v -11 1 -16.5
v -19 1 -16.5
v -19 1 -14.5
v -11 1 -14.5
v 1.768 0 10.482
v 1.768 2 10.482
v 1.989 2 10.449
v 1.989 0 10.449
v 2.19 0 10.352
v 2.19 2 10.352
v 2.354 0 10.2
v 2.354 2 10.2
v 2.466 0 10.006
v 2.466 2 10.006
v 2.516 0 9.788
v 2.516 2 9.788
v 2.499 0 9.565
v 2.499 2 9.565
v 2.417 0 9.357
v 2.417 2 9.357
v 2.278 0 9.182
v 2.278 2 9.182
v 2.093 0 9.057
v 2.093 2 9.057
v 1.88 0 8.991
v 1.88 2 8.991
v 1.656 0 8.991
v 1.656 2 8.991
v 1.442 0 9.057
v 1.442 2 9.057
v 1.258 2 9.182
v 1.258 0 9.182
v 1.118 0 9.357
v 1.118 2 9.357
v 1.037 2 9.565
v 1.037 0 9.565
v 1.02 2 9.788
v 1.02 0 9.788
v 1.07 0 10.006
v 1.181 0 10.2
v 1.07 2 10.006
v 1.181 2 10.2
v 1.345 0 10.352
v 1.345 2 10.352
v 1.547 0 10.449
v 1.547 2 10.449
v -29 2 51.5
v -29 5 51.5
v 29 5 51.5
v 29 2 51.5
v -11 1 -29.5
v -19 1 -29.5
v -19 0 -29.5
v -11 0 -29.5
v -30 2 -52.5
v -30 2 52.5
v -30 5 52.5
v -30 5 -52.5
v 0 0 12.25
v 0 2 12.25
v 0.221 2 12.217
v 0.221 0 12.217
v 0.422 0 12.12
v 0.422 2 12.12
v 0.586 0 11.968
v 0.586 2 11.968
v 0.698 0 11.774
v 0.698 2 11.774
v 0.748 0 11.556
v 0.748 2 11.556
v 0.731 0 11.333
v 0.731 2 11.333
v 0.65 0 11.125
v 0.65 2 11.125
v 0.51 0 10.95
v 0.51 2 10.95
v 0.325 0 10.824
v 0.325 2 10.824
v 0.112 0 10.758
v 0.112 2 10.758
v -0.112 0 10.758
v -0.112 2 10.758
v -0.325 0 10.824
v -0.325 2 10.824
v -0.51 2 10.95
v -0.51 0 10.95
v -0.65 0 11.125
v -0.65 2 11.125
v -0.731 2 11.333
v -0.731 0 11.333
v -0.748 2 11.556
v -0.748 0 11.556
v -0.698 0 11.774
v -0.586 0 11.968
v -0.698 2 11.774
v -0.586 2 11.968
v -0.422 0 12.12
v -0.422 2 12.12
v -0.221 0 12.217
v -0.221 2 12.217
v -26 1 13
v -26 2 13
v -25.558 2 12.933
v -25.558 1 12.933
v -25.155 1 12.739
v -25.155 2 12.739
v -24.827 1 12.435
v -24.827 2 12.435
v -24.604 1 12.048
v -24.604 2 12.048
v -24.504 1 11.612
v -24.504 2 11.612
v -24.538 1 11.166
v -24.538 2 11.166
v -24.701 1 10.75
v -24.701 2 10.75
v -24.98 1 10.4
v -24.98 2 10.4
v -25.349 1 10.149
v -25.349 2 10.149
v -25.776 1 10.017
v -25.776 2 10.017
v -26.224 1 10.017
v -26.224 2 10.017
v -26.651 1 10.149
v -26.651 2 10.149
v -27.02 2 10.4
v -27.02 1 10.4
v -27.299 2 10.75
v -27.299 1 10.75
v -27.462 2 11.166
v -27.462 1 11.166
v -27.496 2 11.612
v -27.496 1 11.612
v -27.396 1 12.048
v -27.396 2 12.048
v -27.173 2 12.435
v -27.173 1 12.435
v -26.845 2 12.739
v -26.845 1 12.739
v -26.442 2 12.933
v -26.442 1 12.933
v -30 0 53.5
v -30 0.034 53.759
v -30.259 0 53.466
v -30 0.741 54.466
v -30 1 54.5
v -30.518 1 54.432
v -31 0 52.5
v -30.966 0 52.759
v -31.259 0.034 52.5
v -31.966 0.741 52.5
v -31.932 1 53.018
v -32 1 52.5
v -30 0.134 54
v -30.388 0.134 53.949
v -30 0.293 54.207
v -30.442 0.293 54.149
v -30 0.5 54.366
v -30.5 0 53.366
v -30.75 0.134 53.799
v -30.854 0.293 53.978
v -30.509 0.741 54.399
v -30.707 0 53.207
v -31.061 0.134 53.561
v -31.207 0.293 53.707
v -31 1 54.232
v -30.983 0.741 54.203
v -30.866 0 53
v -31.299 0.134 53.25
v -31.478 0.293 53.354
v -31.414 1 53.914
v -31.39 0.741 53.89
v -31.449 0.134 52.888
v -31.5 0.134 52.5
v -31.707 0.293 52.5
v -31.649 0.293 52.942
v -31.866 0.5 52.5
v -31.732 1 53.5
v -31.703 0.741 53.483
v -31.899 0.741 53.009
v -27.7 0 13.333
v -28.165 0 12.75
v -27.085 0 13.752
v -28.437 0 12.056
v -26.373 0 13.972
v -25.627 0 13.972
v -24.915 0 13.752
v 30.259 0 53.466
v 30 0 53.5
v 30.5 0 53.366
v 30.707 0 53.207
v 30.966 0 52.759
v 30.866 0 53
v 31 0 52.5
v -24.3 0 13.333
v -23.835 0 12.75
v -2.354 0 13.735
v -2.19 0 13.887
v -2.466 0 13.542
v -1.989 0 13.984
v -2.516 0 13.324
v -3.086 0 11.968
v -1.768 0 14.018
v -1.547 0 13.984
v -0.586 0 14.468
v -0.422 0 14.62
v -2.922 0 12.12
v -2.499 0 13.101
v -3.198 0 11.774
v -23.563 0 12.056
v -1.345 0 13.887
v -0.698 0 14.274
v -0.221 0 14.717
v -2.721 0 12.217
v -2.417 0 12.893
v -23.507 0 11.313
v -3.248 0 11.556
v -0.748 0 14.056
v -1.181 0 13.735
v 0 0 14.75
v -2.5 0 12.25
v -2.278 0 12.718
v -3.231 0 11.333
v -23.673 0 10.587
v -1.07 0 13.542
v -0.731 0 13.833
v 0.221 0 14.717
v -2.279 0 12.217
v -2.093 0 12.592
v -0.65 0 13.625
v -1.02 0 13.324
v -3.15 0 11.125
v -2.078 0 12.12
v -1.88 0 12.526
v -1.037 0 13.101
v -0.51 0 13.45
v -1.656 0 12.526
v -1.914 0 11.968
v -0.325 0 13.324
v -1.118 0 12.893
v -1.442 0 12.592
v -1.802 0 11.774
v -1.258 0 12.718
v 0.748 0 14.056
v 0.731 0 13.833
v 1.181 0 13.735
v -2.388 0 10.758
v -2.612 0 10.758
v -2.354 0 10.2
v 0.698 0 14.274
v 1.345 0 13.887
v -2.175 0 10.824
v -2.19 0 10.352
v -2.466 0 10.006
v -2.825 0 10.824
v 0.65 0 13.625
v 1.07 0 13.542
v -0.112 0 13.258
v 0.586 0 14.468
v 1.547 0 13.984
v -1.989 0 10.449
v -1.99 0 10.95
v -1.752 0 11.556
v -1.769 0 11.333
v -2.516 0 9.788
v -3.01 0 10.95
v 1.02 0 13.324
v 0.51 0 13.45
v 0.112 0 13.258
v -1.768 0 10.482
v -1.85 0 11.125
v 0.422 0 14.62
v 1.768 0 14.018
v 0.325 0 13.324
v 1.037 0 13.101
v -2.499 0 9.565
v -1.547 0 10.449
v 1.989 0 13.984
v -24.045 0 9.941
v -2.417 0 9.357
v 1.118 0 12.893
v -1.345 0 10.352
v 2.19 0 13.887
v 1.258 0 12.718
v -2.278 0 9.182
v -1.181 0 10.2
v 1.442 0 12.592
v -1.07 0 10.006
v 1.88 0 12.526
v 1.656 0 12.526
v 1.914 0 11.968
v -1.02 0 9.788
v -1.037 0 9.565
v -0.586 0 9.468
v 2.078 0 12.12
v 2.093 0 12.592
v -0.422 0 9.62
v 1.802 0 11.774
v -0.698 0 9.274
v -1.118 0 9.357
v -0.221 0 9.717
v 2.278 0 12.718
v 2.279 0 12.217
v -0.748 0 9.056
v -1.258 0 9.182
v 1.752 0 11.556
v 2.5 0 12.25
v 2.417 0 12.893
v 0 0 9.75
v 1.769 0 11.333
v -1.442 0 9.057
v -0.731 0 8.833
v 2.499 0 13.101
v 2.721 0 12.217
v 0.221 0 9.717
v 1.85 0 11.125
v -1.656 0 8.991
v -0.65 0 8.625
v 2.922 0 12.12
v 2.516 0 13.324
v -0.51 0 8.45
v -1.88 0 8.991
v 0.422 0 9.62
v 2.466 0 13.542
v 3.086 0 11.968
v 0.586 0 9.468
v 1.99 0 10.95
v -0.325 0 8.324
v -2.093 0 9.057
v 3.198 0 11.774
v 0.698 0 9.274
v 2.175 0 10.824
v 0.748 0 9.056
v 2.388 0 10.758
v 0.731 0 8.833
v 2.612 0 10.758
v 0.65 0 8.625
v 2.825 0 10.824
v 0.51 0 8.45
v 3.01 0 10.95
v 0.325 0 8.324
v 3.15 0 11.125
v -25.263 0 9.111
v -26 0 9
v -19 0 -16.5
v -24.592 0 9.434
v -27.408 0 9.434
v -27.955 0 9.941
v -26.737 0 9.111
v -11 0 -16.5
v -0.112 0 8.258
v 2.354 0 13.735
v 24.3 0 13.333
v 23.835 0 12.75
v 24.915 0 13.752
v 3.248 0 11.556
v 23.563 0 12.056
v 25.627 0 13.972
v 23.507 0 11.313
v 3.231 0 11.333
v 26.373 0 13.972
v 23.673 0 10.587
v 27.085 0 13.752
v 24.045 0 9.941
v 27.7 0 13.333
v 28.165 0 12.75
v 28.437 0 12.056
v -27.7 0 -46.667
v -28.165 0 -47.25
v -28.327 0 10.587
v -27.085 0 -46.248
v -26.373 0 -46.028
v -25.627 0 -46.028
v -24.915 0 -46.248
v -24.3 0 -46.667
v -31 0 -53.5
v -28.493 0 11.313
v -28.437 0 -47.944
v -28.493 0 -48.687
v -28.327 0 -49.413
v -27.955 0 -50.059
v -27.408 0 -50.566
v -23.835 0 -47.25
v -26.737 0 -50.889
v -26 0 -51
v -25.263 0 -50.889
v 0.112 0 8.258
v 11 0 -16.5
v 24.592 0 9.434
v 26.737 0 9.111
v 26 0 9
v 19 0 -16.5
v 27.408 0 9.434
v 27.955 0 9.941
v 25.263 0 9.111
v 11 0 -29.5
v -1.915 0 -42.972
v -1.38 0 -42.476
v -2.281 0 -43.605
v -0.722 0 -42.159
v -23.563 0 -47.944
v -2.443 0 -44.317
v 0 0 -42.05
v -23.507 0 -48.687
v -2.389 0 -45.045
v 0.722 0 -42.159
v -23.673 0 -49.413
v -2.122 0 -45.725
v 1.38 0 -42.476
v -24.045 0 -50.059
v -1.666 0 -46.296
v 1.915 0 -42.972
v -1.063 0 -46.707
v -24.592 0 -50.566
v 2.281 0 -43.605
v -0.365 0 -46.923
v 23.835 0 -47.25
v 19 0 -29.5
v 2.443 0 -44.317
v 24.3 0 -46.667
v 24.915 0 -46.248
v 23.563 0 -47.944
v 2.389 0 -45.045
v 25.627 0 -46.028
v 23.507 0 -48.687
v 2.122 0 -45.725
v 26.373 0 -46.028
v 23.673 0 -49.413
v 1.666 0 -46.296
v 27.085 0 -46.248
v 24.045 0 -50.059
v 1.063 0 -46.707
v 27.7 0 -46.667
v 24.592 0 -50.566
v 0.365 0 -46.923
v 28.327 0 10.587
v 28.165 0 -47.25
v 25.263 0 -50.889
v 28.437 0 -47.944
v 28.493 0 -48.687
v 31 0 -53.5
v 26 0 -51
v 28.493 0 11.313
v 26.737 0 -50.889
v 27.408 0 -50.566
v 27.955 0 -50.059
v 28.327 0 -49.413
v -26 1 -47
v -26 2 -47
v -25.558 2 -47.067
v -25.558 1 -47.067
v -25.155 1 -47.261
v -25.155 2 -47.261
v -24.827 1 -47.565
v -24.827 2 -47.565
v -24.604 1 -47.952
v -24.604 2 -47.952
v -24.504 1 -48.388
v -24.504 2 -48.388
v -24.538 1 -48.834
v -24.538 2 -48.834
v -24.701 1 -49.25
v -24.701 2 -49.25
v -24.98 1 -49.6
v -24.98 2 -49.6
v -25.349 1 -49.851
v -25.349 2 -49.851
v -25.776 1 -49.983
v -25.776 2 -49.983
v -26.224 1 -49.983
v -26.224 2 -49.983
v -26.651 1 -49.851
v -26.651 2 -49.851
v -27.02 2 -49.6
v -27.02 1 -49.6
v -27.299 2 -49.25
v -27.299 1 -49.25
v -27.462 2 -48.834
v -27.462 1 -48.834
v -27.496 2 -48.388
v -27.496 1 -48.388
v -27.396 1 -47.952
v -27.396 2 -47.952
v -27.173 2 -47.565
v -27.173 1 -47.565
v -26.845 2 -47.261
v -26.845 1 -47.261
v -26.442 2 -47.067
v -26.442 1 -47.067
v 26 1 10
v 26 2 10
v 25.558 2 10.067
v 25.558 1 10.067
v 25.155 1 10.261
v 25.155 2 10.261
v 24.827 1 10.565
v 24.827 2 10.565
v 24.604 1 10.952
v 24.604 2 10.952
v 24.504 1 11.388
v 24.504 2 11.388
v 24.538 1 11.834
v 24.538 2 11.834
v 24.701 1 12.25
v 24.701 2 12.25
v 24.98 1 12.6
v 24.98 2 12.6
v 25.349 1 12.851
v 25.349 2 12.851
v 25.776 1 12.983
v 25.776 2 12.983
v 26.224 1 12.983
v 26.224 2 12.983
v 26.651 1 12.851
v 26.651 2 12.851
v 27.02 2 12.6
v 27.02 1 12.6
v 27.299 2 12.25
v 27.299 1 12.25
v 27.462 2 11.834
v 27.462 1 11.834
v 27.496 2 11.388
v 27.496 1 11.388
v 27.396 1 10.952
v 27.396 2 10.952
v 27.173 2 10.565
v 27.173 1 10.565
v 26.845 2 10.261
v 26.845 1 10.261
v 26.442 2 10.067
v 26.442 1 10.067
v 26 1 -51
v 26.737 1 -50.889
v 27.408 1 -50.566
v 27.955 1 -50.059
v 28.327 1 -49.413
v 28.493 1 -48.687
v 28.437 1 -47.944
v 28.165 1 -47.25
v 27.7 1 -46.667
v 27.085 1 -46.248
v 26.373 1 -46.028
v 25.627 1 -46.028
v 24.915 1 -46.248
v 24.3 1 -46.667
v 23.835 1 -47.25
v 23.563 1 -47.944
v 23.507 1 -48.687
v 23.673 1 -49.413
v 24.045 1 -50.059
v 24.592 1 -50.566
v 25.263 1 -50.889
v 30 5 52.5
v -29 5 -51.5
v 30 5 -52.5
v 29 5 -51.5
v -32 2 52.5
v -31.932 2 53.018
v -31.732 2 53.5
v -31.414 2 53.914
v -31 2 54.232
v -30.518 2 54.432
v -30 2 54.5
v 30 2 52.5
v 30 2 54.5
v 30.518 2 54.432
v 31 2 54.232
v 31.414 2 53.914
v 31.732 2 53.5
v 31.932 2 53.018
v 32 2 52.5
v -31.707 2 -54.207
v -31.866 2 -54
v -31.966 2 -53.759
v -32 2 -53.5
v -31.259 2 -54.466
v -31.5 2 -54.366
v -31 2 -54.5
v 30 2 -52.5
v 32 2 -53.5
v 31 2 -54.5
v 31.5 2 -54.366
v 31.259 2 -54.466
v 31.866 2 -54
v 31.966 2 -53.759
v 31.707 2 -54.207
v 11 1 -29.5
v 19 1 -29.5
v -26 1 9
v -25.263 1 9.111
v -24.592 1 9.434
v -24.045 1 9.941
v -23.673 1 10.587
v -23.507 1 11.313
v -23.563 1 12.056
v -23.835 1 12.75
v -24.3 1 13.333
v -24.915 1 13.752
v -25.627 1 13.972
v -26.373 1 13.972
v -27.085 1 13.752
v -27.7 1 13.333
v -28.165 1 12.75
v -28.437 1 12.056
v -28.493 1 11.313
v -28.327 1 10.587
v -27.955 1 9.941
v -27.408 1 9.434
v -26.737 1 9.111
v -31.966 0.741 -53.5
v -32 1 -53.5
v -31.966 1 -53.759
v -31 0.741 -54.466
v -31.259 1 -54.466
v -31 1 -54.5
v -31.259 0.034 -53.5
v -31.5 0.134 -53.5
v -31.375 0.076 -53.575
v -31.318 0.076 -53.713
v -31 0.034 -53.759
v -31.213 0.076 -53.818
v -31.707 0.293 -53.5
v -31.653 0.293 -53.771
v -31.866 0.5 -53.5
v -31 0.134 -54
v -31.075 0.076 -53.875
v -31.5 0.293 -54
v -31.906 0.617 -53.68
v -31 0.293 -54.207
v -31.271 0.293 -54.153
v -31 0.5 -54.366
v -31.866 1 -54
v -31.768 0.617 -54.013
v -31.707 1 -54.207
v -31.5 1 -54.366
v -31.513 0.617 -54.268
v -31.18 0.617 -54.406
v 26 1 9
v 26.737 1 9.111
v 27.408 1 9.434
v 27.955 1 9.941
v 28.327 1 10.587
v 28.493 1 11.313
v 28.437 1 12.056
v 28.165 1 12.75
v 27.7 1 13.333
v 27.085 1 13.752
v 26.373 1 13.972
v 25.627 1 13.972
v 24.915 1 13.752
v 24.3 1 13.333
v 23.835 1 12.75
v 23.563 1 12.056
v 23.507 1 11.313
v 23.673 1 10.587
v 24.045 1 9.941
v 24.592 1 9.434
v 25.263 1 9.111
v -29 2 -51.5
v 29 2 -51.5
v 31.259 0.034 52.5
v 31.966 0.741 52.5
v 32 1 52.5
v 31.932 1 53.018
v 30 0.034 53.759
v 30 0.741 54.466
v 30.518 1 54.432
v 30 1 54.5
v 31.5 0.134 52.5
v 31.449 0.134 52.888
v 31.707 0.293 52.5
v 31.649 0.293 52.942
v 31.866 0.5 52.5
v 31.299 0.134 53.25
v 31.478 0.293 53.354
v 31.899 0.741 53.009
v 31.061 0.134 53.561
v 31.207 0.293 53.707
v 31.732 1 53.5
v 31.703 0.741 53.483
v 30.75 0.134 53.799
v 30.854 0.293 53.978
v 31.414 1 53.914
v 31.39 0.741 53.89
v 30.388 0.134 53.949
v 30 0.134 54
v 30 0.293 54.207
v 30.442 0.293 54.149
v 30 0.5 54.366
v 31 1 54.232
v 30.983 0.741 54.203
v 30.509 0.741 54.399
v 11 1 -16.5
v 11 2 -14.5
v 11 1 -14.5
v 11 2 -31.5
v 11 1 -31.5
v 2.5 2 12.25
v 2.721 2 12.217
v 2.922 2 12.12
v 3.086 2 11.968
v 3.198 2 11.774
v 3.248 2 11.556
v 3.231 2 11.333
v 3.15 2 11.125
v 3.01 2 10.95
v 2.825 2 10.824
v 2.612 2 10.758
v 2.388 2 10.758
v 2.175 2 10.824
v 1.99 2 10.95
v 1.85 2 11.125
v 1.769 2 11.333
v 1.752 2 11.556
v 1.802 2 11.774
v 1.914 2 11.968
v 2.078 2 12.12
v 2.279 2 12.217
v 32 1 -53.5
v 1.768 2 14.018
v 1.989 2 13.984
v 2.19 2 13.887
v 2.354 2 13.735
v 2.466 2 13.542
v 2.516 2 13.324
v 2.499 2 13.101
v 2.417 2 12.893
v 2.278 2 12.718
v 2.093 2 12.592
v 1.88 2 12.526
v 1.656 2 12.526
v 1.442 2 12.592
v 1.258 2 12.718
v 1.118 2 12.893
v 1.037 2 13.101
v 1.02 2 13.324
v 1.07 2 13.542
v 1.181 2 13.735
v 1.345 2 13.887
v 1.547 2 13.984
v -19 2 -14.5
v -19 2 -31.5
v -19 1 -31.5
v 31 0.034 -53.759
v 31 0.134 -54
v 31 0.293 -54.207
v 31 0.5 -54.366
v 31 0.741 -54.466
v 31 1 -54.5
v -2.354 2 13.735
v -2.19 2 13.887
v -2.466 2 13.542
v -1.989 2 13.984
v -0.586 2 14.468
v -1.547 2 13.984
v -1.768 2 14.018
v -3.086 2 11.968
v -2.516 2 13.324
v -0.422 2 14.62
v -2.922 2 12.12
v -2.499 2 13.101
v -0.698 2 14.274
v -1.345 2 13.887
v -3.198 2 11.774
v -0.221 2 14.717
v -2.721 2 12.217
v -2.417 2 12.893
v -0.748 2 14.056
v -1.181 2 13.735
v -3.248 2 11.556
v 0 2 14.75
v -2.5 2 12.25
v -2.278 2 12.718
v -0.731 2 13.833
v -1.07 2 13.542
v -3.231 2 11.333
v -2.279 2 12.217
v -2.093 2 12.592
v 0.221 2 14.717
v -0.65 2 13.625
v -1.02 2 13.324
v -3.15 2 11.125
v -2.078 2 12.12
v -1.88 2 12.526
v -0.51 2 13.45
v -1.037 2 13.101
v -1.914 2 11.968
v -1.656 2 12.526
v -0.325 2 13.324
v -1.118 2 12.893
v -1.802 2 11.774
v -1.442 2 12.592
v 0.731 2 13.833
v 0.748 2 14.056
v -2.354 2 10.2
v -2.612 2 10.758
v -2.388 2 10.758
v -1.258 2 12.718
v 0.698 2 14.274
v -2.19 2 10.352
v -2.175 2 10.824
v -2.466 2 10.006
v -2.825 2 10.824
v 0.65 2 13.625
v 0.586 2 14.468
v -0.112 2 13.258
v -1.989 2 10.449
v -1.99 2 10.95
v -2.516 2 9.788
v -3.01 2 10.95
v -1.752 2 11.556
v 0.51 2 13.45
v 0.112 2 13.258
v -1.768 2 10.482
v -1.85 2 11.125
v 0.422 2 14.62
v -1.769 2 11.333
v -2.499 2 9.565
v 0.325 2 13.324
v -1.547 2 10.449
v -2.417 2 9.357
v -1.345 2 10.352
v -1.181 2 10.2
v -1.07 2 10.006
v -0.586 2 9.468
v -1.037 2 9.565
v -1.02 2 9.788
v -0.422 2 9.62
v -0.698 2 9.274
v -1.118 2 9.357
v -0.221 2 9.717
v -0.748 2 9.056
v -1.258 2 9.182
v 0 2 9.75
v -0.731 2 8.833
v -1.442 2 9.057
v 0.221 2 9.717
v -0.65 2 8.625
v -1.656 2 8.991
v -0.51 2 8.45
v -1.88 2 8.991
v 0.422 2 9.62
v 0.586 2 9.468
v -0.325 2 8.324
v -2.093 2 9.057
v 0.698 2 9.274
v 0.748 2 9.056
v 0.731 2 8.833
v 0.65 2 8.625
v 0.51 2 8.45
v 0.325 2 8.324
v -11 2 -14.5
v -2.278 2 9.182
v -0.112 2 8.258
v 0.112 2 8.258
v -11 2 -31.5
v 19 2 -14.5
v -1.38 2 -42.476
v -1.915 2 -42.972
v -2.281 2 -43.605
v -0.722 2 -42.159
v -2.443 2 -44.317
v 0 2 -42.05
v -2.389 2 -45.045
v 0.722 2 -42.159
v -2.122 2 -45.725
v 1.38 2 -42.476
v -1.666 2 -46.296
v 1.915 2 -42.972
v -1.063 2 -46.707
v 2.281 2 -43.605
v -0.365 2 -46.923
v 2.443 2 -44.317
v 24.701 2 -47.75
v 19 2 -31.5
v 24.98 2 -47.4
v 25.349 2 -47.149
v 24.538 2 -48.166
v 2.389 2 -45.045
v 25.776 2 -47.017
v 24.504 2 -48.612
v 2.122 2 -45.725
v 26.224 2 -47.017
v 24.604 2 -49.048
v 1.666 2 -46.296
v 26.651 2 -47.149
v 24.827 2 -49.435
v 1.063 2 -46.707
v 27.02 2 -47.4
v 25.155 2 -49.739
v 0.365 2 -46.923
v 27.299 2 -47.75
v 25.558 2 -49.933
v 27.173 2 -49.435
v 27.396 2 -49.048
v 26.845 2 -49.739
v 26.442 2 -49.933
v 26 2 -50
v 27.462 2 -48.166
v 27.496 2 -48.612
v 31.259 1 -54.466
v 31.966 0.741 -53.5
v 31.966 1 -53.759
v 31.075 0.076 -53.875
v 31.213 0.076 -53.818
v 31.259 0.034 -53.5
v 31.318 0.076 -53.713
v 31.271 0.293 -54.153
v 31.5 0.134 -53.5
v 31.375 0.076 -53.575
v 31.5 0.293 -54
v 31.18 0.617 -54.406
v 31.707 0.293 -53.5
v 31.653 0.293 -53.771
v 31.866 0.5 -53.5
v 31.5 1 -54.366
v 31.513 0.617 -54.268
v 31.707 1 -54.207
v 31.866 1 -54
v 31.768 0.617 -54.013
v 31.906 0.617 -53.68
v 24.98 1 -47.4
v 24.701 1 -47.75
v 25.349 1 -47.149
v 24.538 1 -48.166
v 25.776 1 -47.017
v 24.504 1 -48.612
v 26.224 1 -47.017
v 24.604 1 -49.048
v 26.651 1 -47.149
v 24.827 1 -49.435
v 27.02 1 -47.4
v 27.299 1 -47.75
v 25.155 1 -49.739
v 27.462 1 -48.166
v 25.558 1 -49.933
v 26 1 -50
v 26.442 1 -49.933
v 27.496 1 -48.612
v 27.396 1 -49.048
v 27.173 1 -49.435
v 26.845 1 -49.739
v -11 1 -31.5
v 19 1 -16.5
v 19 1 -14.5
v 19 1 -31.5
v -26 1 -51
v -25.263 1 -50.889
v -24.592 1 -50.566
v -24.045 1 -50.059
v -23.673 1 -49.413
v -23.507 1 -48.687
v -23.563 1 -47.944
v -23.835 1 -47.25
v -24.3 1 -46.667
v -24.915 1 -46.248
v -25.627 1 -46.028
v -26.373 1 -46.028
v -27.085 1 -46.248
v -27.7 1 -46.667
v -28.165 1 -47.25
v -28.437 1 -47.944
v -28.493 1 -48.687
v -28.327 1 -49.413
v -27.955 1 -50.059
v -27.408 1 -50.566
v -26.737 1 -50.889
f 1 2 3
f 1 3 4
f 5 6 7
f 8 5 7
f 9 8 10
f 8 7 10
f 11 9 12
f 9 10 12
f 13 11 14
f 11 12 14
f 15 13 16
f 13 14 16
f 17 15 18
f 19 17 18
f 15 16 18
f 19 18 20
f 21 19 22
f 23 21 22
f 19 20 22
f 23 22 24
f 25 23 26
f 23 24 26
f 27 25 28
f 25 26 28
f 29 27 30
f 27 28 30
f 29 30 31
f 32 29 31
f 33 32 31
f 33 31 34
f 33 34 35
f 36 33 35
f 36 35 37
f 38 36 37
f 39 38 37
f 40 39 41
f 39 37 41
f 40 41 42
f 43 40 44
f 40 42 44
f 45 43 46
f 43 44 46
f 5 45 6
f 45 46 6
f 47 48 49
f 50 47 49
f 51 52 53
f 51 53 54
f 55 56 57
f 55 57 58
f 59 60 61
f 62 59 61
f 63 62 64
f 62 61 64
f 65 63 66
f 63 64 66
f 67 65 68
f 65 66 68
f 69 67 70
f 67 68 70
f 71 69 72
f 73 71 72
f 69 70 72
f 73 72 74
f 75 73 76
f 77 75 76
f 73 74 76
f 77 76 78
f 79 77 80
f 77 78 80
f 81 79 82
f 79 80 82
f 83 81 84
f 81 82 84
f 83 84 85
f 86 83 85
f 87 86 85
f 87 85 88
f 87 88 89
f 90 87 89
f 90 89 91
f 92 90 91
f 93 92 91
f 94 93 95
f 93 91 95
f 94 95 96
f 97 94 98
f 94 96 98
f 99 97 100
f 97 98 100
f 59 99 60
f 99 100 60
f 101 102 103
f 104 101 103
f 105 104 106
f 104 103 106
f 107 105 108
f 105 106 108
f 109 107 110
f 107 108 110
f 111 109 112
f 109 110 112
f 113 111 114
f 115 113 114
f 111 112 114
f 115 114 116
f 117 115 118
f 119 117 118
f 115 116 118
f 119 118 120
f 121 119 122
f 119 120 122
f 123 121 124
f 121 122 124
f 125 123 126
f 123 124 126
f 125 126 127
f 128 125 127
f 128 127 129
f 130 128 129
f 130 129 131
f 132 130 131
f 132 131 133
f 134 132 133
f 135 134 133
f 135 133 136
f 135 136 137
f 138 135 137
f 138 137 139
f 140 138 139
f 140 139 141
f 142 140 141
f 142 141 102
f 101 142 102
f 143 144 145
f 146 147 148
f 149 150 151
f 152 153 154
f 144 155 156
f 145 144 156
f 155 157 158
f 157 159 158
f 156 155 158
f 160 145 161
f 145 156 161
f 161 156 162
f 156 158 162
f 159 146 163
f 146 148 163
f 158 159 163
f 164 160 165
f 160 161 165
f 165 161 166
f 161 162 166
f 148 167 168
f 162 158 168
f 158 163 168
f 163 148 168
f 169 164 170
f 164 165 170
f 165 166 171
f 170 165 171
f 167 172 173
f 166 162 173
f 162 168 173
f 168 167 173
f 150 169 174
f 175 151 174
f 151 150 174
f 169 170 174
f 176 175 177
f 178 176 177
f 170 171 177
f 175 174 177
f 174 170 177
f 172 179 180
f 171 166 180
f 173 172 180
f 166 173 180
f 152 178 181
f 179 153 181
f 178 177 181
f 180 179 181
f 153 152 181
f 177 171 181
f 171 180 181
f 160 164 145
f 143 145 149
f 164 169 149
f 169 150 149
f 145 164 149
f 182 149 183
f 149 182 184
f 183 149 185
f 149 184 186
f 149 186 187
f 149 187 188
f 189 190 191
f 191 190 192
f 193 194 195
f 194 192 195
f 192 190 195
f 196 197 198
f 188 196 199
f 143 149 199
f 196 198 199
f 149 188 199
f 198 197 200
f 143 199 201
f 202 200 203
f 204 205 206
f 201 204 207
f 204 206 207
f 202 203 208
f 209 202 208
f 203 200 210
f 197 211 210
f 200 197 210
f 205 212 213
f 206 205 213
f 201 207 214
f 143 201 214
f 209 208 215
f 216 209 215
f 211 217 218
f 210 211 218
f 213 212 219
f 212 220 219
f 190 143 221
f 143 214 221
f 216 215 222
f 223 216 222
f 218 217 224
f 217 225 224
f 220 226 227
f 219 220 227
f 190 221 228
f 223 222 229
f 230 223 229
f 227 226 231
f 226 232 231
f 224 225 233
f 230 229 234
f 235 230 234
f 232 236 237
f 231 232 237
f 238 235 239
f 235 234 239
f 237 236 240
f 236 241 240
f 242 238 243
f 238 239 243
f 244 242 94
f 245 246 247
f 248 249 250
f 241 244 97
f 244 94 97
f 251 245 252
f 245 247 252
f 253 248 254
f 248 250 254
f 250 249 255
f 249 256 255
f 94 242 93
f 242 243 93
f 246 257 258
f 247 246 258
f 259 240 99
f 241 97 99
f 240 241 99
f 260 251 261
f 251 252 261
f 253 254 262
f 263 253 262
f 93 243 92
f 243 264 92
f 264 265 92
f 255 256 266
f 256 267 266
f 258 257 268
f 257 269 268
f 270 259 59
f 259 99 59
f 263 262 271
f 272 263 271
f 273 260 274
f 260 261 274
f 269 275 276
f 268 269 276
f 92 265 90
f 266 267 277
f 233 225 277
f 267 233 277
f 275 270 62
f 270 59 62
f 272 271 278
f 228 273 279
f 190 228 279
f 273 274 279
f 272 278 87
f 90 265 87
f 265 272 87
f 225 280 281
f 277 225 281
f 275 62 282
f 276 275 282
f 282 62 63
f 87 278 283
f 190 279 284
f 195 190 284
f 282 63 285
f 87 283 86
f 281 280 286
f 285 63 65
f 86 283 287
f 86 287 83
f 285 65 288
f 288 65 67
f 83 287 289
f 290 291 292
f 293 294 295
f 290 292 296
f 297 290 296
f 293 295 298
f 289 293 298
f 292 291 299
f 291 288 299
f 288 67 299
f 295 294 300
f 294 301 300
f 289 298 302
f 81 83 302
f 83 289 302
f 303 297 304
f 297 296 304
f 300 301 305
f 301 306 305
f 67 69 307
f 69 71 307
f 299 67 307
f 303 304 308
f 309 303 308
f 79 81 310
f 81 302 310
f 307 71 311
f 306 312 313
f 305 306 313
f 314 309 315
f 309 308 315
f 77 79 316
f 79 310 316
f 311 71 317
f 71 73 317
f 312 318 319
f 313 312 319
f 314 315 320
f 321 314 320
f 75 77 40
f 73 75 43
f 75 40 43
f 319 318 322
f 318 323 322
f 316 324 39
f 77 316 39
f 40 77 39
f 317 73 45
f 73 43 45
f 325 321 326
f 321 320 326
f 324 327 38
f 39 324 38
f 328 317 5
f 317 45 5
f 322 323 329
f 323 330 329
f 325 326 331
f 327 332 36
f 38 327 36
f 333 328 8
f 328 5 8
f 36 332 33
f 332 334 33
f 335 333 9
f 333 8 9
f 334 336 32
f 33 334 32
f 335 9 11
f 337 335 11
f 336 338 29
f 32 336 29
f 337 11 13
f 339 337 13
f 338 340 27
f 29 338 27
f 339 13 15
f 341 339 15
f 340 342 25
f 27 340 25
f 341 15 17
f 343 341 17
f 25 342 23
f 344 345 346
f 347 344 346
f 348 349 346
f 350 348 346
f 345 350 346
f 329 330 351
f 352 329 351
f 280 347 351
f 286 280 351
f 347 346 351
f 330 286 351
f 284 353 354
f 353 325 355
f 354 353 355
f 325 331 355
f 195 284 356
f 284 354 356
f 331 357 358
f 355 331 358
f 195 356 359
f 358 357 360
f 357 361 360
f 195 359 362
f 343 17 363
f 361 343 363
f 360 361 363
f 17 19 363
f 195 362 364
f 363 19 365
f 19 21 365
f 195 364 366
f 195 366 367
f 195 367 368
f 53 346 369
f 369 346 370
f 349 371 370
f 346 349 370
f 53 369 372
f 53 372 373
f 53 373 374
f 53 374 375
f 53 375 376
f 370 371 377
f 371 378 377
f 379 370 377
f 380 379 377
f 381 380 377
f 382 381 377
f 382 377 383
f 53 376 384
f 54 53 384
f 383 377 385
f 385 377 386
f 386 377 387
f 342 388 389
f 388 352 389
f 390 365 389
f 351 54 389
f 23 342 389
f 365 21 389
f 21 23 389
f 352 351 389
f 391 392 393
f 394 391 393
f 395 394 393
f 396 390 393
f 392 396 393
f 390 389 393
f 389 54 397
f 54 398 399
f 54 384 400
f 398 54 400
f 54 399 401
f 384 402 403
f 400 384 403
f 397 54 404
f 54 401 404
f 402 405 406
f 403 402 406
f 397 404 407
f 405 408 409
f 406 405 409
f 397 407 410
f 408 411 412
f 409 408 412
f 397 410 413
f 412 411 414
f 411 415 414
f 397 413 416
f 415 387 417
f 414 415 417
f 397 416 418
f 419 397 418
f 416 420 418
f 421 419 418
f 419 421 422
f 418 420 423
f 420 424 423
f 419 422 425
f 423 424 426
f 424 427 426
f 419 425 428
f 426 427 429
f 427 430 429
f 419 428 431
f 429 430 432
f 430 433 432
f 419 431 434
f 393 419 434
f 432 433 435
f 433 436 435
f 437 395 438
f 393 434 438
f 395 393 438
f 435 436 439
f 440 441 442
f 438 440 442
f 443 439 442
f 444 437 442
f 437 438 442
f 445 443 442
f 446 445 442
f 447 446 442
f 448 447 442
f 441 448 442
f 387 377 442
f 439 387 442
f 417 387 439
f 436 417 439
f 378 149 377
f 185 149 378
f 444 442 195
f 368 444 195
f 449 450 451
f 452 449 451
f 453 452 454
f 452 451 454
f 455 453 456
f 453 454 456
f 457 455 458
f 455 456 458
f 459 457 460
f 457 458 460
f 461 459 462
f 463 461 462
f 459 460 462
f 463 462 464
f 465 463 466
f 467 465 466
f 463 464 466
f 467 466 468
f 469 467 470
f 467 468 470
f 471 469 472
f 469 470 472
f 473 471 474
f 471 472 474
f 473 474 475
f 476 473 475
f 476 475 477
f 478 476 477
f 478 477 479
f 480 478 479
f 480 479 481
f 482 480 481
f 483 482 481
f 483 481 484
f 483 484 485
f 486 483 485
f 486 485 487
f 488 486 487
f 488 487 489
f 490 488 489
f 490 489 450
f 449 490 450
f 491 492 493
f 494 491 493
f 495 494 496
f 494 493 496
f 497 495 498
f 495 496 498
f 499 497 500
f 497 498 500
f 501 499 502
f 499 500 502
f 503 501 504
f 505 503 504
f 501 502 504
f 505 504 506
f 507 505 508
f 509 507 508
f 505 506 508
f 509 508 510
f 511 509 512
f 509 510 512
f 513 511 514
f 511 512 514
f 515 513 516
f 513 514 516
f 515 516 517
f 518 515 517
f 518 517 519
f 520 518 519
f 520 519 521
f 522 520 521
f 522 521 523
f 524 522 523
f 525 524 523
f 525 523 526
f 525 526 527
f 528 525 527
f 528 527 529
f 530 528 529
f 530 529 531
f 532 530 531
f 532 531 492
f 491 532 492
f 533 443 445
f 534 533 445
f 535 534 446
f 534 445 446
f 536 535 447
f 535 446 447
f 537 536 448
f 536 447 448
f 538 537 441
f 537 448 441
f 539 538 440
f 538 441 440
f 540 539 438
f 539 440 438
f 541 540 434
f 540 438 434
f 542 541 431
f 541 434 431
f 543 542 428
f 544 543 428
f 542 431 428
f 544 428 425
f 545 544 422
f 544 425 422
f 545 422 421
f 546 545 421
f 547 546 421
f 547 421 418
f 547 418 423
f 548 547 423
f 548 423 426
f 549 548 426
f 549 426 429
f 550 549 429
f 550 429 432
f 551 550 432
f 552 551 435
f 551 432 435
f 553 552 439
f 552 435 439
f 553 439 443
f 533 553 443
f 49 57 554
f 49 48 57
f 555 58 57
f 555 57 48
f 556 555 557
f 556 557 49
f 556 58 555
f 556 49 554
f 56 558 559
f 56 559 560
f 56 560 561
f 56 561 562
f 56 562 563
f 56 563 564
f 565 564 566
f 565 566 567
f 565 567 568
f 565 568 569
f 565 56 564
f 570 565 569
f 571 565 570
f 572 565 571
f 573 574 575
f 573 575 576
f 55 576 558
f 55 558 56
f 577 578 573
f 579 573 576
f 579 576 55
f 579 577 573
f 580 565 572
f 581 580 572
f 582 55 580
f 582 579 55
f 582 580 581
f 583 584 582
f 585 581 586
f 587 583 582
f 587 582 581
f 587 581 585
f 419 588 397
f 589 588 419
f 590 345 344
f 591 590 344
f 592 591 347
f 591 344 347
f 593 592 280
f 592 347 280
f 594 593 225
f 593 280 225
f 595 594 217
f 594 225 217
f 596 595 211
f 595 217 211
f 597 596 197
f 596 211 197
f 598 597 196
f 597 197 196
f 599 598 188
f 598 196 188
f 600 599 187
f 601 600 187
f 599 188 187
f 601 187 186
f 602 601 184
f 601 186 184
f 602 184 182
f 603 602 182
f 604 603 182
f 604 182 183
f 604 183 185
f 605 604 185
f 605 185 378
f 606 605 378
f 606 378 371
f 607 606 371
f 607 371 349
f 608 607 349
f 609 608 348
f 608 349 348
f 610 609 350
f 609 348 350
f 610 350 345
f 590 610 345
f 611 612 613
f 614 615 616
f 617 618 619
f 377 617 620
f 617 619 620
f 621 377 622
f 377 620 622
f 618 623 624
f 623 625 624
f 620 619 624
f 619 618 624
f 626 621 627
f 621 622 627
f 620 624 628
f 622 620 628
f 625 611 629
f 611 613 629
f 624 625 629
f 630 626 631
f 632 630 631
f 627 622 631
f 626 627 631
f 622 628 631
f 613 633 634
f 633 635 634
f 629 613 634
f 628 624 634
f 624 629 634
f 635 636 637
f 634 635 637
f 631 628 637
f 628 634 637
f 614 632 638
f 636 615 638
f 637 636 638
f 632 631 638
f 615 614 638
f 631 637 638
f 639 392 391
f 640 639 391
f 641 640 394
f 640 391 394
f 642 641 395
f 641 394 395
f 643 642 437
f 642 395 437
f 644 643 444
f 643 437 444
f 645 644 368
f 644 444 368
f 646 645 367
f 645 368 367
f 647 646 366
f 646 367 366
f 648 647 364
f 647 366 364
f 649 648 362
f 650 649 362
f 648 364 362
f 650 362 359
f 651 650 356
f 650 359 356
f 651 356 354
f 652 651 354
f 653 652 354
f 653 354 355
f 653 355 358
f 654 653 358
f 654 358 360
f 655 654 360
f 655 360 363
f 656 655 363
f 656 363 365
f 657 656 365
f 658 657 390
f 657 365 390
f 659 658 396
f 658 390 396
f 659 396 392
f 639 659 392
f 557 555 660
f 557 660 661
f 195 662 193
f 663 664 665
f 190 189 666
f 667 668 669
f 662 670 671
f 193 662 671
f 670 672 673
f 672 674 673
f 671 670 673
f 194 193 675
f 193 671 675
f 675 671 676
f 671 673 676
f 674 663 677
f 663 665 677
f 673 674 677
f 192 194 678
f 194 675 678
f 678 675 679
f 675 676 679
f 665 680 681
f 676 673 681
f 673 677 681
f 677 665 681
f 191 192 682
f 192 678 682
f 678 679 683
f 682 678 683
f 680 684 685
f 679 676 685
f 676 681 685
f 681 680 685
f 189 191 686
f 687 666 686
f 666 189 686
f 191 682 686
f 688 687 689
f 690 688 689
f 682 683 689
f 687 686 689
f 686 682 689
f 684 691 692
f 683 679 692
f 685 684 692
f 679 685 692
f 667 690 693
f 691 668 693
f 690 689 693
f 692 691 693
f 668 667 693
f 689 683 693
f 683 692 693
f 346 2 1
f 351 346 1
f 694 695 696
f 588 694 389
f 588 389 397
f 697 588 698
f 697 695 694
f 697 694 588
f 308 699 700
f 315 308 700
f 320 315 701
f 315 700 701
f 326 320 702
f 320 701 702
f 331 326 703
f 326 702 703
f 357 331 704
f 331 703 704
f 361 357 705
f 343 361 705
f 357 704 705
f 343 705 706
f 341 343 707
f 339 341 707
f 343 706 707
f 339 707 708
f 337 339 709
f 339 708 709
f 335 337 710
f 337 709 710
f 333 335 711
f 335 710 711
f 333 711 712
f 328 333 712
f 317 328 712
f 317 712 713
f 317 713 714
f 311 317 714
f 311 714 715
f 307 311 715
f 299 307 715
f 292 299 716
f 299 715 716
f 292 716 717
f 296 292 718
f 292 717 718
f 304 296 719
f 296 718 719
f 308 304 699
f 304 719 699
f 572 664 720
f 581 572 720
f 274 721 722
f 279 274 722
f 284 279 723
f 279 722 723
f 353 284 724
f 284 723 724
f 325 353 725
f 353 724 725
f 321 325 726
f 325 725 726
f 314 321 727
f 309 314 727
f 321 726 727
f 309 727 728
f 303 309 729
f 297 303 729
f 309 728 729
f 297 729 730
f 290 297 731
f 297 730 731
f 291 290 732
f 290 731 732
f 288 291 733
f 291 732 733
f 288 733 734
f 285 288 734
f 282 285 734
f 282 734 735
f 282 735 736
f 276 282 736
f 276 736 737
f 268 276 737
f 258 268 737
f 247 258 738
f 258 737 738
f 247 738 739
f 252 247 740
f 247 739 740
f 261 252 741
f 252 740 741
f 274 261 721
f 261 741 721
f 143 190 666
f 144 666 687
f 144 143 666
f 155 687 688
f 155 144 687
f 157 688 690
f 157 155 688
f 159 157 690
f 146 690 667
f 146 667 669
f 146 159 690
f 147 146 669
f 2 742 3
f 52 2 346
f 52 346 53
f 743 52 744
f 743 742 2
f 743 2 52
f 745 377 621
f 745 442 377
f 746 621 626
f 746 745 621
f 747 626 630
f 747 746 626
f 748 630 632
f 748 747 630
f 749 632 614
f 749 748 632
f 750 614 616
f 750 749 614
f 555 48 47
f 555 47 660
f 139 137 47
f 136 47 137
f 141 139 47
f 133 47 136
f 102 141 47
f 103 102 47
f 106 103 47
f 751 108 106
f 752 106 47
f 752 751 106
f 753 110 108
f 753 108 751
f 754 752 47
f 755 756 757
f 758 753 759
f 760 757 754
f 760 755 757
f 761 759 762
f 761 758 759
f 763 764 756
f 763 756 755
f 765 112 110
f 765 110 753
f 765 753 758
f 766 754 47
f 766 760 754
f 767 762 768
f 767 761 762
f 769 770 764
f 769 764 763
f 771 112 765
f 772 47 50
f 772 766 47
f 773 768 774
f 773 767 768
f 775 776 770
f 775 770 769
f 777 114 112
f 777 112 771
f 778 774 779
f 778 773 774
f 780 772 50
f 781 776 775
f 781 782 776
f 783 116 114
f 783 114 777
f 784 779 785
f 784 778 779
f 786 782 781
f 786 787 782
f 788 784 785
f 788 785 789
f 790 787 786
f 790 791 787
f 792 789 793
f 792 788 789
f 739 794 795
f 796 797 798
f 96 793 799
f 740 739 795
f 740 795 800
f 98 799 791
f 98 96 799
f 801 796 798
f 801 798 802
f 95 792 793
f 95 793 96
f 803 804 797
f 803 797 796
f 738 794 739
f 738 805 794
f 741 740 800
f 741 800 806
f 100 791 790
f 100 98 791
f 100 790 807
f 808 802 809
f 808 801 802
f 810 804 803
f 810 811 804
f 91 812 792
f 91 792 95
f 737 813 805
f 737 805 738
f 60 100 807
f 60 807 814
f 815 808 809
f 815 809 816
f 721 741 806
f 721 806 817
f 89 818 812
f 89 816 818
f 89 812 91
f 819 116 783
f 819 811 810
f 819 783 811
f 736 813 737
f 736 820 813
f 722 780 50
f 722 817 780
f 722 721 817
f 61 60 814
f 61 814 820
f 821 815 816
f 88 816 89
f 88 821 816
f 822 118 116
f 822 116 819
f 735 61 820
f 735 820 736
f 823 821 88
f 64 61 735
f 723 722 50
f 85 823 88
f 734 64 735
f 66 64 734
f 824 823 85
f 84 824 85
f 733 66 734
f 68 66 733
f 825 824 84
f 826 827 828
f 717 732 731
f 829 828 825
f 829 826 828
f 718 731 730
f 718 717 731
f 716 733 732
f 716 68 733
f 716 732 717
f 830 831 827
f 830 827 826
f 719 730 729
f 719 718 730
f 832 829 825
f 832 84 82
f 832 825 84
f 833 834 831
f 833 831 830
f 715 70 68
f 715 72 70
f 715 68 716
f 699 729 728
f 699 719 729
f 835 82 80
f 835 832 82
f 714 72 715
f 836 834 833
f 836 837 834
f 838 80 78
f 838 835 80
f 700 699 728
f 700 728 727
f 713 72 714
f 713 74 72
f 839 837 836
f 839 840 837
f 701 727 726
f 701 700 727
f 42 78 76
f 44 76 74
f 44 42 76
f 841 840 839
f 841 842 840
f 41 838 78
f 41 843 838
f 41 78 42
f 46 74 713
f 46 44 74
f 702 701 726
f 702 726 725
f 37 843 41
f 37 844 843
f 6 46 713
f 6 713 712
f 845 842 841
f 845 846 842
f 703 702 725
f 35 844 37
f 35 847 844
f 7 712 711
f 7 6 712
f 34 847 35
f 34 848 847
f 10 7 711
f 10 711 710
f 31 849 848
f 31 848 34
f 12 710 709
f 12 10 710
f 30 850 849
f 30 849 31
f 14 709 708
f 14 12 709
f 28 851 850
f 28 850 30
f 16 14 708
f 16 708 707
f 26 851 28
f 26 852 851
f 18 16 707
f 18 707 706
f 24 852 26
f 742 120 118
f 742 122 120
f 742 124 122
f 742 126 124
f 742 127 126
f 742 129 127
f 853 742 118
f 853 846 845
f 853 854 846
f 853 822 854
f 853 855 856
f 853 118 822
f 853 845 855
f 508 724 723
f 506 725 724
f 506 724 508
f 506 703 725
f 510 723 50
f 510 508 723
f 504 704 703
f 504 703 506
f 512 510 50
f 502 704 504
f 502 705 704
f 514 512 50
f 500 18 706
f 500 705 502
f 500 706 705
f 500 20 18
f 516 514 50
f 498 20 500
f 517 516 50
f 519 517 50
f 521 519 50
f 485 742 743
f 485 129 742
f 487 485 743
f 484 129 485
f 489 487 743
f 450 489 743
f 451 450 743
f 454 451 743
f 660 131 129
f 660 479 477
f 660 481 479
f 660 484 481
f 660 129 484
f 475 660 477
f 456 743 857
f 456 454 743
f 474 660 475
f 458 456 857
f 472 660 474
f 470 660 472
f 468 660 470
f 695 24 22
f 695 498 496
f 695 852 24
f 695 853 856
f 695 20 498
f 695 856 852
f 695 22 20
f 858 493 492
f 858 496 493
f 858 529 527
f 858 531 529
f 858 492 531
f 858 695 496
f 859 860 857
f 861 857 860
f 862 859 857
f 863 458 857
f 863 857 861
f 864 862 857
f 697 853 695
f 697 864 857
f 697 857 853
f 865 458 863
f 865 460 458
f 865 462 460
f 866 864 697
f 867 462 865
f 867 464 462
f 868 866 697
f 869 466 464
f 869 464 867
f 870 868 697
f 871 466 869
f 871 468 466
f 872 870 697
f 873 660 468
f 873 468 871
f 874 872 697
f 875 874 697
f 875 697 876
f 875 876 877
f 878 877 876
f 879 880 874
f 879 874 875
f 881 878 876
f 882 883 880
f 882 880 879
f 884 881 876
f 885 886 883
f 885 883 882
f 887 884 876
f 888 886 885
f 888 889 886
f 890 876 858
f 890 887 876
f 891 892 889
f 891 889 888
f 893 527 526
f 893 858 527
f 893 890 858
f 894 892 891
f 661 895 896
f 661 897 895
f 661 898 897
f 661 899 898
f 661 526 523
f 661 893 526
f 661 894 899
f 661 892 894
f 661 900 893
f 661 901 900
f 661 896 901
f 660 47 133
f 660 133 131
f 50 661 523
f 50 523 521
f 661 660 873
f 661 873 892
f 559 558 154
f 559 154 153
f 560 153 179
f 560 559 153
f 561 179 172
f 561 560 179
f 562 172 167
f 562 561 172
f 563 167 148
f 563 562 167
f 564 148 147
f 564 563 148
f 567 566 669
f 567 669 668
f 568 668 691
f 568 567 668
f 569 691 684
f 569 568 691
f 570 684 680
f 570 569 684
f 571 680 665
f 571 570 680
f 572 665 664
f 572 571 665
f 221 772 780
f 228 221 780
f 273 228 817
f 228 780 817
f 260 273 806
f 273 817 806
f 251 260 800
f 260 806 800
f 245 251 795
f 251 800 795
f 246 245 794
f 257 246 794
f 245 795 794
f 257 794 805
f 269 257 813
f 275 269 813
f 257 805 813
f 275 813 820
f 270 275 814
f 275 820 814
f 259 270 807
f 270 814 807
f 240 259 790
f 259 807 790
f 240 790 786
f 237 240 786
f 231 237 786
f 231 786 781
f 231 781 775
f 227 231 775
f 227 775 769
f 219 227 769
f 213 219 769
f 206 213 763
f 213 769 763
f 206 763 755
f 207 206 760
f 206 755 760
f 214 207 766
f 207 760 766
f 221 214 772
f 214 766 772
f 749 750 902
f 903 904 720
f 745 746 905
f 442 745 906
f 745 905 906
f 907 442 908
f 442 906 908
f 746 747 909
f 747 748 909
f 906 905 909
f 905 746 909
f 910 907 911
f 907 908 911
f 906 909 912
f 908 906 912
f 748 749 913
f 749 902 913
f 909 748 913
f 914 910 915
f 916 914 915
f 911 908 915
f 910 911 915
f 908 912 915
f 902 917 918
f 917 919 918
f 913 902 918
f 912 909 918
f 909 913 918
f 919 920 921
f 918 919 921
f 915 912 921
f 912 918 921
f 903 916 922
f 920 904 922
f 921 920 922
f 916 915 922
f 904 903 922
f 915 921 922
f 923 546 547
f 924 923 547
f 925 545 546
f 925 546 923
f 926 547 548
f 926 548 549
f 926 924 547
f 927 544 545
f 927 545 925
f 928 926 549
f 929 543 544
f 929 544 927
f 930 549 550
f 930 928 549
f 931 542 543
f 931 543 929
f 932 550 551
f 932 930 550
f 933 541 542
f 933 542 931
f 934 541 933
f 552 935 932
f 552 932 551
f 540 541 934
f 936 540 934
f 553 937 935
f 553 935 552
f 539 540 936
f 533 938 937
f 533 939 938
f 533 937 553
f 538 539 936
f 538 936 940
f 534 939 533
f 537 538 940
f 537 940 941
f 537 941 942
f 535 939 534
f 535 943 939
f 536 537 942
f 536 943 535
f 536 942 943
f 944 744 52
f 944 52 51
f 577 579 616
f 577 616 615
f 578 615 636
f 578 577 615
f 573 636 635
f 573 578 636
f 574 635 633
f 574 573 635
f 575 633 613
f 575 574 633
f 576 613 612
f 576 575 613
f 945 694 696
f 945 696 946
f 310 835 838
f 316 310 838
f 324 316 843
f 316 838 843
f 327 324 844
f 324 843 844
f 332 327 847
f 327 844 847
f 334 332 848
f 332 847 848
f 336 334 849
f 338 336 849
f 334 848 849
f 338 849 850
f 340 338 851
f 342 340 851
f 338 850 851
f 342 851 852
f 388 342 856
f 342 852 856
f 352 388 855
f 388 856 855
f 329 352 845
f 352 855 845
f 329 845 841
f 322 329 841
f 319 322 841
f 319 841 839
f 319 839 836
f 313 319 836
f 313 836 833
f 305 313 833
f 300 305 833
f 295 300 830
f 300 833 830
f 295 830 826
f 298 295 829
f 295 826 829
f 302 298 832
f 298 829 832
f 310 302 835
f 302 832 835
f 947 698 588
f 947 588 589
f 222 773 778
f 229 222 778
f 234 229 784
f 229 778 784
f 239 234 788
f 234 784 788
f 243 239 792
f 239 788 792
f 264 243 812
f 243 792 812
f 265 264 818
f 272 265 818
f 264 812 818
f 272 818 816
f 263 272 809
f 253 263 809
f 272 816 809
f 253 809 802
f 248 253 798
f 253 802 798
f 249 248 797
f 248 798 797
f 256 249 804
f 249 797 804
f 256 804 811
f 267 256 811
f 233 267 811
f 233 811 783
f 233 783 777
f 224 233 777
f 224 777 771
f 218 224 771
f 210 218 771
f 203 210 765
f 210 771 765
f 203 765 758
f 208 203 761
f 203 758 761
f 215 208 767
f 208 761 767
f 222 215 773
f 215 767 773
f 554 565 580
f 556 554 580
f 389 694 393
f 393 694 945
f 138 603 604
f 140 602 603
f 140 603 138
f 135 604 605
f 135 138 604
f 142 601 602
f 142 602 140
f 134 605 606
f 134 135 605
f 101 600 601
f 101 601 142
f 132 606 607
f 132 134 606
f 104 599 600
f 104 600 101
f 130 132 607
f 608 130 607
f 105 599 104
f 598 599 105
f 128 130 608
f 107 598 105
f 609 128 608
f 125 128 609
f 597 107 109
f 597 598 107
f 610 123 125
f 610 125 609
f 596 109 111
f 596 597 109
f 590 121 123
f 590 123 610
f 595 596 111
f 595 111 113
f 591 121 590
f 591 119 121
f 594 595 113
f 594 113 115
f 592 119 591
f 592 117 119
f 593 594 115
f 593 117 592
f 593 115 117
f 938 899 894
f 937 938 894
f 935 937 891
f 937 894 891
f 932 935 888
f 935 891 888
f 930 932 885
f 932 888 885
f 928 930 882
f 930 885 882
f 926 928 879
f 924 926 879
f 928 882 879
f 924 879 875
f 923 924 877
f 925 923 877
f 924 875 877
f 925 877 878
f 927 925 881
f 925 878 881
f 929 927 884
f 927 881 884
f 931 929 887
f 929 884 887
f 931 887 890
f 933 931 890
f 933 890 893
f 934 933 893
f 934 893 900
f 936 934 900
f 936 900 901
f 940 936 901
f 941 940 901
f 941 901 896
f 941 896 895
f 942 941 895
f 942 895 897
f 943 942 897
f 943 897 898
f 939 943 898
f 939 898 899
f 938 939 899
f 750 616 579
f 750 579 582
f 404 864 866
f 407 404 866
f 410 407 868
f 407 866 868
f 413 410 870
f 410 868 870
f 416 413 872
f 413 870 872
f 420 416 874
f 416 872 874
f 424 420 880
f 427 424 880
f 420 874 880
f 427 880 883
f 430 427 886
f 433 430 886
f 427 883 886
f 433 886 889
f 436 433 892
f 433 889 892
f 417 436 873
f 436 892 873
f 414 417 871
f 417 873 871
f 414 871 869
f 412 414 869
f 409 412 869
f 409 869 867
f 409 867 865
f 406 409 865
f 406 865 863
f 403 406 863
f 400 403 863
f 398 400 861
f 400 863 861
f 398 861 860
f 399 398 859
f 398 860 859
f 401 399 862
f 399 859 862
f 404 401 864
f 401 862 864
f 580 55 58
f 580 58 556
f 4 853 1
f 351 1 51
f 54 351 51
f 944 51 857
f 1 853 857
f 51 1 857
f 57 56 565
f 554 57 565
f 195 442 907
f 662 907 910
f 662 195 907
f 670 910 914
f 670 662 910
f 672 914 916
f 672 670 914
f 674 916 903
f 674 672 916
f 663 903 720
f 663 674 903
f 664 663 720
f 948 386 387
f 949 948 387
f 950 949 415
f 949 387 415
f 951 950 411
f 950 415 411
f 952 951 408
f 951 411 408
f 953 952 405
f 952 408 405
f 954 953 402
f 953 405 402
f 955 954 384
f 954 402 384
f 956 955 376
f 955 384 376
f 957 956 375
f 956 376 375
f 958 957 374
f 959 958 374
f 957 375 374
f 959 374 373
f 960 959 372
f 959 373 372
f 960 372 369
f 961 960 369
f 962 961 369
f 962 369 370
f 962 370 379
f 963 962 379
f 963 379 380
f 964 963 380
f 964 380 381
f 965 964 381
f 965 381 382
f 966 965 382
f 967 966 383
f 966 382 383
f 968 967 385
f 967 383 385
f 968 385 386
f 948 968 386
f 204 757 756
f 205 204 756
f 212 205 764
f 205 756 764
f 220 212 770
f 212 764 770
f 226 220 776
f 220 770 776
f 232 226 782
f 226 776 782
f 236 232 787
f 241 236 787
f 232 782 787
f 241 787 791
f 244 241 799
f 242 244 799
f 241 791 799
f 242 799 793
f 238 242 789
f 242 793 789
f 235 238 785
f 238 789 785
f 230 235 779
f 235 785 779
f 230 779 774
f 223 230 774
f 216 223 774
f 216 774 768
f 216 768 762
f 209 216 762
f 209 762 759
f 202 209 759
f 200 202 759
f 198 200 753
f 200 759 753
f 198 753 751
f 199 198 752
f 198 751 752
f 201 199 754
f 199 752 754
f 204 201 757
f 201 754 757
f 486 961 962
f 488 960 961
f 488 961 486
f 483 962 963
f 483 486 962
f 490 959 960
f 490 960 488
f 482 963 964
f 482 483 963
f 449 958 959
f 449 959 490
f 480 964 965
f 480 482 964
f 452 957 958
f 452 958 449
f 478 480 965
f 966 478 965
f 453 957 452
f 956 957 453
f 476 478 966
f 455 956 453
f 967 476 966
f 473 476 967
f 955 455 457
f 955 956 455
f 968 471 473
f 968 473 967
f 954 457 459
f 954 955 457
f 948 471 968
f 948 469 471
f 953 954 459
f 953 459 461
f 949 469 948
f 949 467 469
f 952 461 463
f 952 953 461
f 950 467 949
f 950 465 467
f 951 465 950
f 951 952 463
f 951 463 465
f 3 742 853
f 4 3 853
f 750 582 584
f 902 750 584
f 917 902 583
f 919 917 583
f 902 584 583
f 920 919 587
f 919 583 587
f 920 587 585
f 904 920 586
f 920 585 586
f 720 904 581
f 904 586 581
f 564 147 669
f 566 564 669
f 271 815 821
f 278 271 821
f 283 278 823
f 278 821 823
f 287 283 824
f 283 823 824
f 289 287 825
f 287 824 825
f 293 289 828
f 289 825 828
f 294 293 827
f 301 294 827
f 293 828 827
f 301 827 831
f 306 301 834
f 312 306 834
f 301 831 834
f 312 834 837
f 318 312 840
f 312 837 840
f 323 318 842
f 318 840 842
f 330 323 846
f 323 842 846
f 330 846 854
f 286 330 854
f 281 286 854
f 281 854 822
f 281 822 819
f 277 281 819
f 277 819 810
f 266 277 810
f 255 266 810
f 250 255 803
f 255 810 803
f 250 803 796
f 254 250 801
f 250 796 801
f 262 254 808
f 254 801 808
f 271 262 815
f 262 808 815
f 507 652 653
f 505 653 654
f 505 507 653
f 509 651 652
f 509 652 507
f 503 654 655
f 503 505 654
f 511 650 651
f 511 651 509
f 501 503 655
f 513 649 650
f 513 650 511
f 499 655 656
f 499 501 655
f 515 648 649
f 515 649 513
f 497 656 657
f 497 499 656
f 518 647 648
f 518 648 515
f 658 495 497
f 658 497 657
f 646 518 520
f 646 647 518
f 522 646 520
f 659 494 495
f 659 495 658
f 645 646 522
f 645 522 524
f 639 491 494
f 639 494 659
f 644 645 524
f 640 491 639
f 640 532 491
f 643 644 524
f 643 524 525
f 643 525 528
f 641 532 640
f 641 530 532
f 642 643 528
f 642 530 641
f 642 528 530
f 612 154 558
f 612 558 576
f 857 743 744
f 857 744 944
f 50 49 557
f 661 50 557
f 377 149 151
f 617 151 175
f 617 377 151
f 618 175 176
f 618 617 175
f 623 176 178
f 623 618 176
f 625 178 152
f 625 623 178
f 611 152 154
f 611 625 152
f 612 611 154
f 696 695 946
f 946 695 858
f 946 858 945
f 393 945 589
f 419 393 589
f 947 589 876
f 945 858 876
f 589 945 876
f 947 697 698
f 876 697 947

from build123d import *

# Parameters (mm, degrees)
SKETCH1_W           = 64
SKETCH1_H           = 109
BOSS_EXTRUDE1_DEPTH = 2
SKETCH2_W           = 60
SKETCH2_H           = 105
BOSS_EXTRUDE2_DEPTH = 3
SKETCH3_W           = 58
SKETCH3_H           = 103
CUT_EXTRUDE1_DEPTH  = 3
SKETCH4_R           = 1.5
CUT_EXTRUDE2_DEPTH  = 2
SKETCH6_R           = 2.5
CUT_EXTRUDE3_DEPTH  = 1
SKETCH7_R           = 2.45
CUT_EXTRUDE4_DEPTH  = 2
SKETCH8_W           = 8
SKETCH8_H           = 13
CUT_EXTRUDE5_DEPTH  = 2
SKETCH9_W           = 8
SKETCH9_H           = 13
CUT_EXTRUDE6_DEPTH  = 2
FILLET2_R           = 1
FILLET3_R           = 1
FILLET4_R           = 2
FILLET5_R           = 2
FILLET6_R           = 1
SKETCH10_W          = 8
SKETCH10_H          = 17
CUT_EXTRUDE7_DEPTH  = 1
SKETCH11_R          = 0.75
CUT_EXTRUDE8_DEPTH  = 2


with BuildPart() as part:
    # Sketch1 → Boss-Extrude1 (new body)
    with BuildSketch(Plane(origin=(0, 0, 0), x_dir=(1, 0, 0), z_dir=(0, 1, 0))):
        Rectangle(SKETCH1_W, SKETCH1_H)
    extrude(amount=BOSS_EXTRUDE1_DEPTH)

    # Sketch2 → Boss-Extrude2 (add)
    with BuildSketch(Plane(origin=(0, 2, 0), x_dir=(1, 0, 0), z_dir=(0, 1, 0))):
        Rectangle(SKETCH2_W, SKETCH2_H)
    extrude(amount=BOSS_EXTRUDE2_DEPTH)

    # Sketch3 → Cut-Extrude1 (cut)
    with BuildSketch(Plane(origin=(0, 5, 0), x_dir=(1, 0, 0), z_dir=(0, 1, 0))):
        Rectangle(SKETCH3_W, SKETCH3_H)
    extrude(amount=-CUT_EXTRUDE1_DEPTH, mode=Mode.SUBTRACT)

    # Sketch4 → Cut-Extrude2 (cut)
    with BuildSketch(Plane(origin=(0, 2, 0), x_dir=(1, 0, 0), z_dir=(0, 1, 0))):
        with Locations(Location((-26, 48.5, 0), (0, 0, 270))):
            Circle(SKETCH4_R)
        with Locations(Location((-26, -11.5, 0), (0, 0, 270))):
            Circle(SKETCH4_R)
        with Locations(Location((26, -11.5, 0), (0, 0, 90))):
            Circle(SKETCH4_R)
        with Locations(Location((26, 48.5, 0), (0, 0, 90))):
            Circle(SKETCH4_R)
    extrude(amount=-CUT_EXTRUDE2_DEPTH, mode=Mode.SUBTRACT)

    # Sketch6 → Cut-Extrude3 (cut)
    with BuildSketch(Plane.XZ):
        with Locations(Location((26, -48.5, 0), (0, 0, 270))):
            Circle(SKETCH6_R)
        with Locations(Location((-26, -48.5, 0), (0, 0, 270))):
            Circle(SKETCH6_R)
        with Locations(Location((26, 11.5, 0), (0, 0, 270))):
            Circle(SKETCH6_R)
        with Locations(Location((-26, 11.5, 0), (0, 0, 270))):
            Circle(SKETCH6_R)
    extrude(amount=-CUT_EXTRUDE3_DEPTH, mode=Mode.SUBTRACT)

    # Sketch7 → Cut-Extrude4 (cut)
    with BuildSketch(Plane(origin=(0, 2, 0), x_dir=(1, 0, 0), z_dir=(0, 1, 0))):
        with Locations(Location((0, 44.5, 0), (0, 0, 270))):
            Circle(SKETCH7_R)
    extrude(amount=-CUT_EXTRUDE4_DEPTH, mode=Mode.SUBTRACT)

    # Sketch8 → Cut-Extrude5 (cut)
    with BuildSketch(Plane(origin=(0, 2, 0), x_dir=(1, 0, 0), z_dir=(0, 1, 0))):
        with Locations((-15, 23)):
            Rectangle(SKETCH8_W, SKETCH8_H)
    extrude(amount=-CUT_EXTRUDE5_DEPTH, mode=Mode.SUBTRACT)

    # Sketch9 → Cut-Extrude6 (cut)
    with BuildSketch(Plane(origin=(0, 2, 0), x_dir=(1, 0, 0), z_dir=(0, 1, 0))):
        with Locations((15, 23)):
            Rectangle(SKETCH9_W, SKETCH9_H)
    extrude(amount=-CUT_EXTRUDE6_DEPTH, mode=Mode.SUBTRACT)

    # Fillet2
    fillet2_edges = [part.edges().sort_by_distance(p)[0] for p in [
        (32, 1, -54.5),
    ]]
    fillet(fillet2_edges, radius=FILLET2_R)

    # Fillet3
    fillet3_edges = [part.edges().sort_by_distance(p)[0] for p in [
        (-32, 1, -54.5),
    ]]
    fillet(fillet3_edges, radius=FILLET3_R)

    # Fillet4
    fillet4_edges = [part.edges().sort_by_distance(p)[0] for p in [
        (-32, 1, 54.5),
    ]]
    fillet(fillet4_edges, radius=FILLET4_R)

    # Fillet5
    fillet5_edges = [part.edges().sort_by_distance(p)[0] for p in [
        (32, 1, 54.5),
    ]]
    fillet(fillet5_edges, radius=FILLET5_R)

    # Fillet6
    fillet6_edges = [part.edges().sort_by_distance(p)[0] for p in [
        (0, 0, -54.5),
        (31.707106781, 0, -54.207106781),
        (-32, 0, -0.5),
        (-31.707106781, 0, -54.207106781),
        (0, 0, 54.5),
        (-31.414213562, 0, 53.914213562),
        (32, 0, -0.5),
        (31.414213562, 0, 53.914213562),
    ]]
    fillet(fillet6_edges, radius=FILLET6_R)

    # Sketch10 → Cut-Extrude7 (cut)
    with BuildSketch(Plane(origin=(0, 2, 0), x_dir=(1, 0, 0), z_dir=(0, 1, 0))):
        with Locations((-15, 23)):
            Rectangle(SKETCH10_W, SKETCH10_H)
        with Locations((15, 23)):
            Rectangle(SKETCH10_W, SKETCH10_H)
    extrude(amount=-CUT_EXTRUDE7_DEPTH, mode=Mode.SUBTRACT)

    # Sketch11 → Cut-Extrude8 (cut)
    with BuildSketch(Plane(origin=(0, 2, 0), x_dir=(1, 0, 0), z_dir=(0, 1, 0))):
        with Locations(Location((0, -11.5, 0), (0, 0, 270))):
            Circle(SKETCH11_R)
        with Locations(Location((0, -9, 0), (0, 0, 270))):
            Circle(SKETCH11_R)
        with Locations(Location((1.767766953, -9.732233047, 0), (0, 0, 270))):
            Circle(SKETCH11_R)
        with Locations(Location((2.5, -11.5, 0), (0, 0, 270))):
            Circle(SKETCH11_R)
        with Locations(Location((1.767766953, -13.267766953, 0), (0, 0, 270))):
            Circle(SKETCH11_R)
        with Locations(Location((0, -14, 0), (0, 0, 270))):
            Circle(SKETCH11_R)
        with Locations(Location((-1.767766953, -9.732233047, 0), (0, 0, 270))):
            Circle(SKETCH11_R)
        with Locations(Location((-2.5, -11.5, 0), (0, 0, 270))):
            Circle(SKETCH11_R)
        with Locations(Location((-1.767766953, -13.267766953, 0), (0, 0, 270))):
            Circle(SKETCH11_R)
    extrude(amount=-CUT_EXTRUDE8_DEPTH, mode=Mode.SUBTRACT)


solid = part.part
